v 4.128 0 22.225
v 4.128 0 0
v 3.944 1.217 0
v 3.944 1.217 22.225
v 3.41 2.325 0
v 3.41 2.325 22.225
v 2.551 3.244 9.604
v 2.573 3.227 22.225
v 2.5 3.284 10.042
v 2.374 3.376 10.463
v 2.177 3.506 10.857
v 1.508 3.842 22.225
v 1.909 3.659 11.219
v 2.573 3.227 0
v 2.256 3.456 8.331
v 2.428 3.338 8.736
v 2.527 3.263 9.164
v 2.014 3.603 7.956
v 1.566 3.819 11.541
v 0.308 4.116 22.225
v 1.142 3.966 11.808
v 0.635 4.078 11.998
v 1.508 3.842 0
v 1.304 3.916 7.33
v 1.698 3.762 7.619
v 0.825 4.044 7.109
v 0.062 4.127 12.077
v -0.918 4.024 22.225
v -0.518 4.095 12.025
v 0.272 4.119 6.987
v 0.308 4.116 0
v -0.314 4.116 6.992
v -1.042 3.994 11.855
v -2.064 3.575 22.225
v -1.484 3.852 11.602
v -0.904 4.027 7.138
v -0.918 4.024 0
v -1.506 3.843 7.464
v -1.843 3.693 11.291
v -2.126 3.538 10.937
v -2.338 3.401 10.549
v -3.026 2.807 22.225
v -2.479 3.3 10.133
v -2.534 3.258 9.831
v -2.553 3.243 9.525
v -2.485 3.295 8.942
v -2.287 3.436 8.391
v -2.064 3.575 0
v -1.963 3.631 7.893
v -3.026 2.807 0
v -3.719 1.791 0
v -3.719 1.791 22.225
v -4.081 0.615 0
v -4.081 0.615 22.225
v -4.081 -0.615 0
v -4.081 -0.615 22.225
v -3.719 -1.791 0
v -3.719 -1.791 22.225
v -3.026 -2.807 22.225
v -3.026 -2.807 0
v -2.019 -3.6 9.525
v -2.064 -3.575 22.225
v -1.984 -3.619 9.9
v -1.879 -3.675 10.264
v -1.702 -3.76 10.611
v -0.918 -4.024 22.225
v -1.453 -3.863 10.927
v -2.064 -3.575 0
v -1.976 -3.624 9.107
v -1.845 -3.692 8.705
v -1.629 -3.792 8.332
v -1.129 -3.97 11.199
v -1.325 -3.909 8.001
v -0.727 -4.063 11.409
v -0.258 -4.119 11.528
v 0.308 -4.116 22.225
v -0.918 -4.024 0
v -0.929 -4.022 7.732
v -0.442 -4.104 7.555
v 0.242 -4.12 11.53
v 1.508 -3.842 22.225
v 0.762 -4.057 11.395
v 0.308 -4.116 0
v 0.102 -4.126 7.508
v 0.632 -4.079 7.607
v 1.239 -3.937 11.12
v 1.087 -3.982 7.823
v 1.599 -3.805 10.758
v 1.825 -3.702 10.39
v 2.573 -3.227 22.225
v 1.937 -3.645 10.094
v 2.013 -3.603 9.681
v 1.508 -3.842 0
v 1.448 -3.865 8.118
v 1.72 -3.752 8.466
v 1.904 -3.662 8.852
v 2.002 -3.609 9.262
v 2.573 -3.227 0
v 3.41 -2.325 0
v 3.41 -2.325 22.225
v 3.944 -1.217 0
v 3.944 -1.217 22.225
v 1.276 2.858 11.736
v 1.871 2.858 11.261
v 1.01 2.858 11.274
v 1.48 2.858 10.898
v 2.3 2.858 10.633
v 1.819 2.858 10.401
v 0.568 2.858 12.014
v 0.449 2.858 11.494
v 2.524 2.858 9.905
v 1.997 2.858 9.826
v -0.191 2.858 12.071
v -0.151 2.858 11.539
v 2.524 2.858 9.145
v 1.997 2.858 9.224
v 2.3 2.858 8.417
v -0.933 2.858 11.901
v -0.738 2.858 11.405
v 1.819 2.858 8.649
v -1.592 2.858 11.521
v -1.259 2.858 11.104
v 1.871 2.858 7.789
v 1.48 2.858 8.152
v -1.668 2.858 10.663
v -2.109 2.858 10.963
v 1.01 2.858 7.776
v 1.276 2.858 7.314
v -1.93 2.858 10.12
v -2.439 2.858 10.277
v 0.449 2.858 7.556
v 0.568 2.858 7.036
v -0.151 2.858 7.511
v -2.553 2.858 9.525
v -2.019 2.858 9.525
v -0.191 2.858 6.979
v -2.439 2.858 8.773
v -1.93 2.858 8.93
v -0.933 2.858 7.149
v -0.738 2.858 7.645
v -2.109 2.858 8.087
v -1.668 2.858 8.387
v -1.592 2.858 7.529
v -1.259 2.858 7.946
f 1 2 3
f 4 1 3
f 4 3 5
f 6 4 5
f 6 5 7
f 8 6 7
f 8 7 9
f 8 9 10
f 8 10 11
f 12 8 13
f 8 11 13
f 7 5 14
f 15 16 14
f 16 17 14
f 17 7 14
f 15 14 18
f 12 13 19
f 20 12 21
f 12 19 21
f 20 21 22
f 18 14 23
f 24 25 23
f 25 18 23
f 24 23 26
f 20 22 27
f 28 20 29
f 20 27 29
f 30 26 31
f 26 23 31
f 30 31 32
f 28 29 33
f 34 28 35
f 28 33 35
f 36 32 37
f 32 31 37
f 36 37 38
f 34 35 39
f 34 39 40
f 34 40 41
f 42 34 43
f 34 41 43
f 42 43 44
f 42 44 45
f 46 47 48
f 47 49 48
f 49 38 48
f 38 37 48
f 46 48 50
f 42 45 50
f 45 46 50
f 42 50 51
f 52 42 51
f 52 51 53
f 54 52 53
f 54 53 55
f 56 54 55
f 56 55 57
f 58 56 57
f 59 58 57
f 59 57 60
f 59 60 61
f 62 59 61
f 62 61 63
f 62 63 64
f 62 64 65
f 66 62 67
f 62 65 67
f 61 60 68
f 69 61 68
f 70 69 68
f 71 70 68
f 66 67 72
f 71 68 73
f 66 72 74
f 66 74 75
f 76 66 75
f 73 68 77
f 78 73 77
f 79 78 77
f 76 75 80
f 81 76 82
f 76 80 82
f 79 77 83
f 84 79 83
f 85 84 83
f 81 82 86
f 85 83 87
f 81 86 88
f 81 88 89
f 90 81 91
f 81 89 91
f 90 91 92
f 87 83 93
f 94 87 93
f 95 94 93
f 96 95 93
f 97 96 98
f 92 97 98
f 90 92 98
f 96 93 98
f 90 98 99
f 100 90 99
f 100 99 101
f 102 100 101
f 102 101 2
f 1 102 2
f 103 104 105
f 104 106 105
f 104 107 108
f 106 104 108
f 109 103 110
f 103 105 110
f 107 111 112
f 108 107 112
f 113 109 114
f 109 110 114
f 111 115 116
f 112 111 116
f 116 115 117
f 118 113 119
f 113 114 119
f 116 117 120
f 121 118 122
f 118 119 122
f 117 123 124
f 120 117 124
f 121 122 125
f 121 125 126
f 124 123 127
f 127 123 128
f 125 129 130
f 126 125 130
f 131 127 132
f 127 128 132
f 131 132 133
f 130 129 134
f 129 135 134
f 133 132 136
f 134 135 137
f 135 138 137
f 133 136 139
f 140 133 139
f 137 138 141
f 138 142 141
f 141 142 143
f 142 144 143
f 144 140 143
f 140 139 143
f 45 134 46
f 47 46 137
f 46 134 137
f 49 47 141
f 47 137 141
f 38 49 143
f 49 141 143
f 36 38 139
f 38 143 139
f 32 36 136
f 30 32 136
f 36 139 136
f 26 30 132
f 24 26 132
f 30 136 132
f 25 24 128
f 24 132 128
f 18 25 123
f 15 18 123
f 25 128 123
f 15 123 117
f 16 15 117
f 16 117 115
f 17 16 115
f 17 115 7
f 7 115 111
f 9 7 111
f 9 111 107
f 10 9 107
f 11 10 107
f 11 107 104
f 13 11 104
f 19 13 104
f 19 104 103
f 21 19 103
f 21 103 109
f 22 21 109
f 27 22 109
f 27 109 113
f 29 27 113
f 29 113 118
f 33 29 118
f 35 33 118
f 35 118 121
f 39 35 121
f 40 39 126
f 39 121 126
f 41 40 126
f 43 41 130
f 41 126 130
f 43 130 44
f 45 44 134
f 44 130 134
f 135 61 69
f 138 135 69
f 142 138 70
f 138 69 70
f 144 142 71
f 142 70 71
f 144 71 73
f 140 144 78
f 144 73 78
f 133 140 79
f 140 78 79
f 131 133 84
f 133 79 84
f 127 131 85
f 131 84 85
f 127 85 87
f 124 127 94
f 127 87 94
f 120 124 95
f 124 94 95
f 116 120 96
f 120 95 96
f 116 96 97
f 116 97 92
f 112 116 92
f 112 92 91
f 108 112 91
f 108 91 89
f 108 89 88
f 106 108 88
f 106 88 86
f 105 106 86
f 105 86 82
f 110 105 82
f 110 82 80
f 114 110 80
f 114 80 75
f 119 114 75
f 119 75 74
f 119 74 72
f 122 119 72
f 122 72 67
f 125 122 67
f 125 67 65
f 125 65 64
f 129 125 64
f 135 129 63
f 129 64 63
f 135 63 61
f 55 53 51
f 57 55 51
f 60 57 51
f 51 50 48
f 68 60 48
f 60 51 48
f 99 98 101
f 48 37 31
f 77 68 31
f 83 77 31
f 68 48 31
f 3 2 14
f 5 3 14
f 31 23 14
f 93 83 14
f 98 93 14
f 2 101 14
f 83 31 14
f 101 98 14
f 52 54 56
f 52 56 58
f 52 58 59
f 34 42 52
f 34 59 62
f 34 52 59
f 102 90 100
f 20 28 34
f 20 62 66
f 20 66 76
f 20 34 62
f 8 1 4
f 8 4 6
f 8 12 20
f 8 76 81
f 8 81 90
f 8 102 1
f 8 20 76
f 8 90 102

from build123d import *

# Parameters (mm, degrees)
SKETCH1_R                      = 4.1275
BOSS_EXTRUDE1_DEPTH            = 22.225
F_7_0_201_DIAMETER_HOLE1_D     = 5.1054
F_7_0_201_DIAMETER_HOLE1_DEPTH = 1.27
F_10_32_TAPPED_HOLE1_D         = 4.0386


with BuildPart() as part:
    # Sketch1 → Boss-Extrude1 (new body)
    with BuildSketch(Plane.XY):
        Circle(SKETCH1_R)
    extrude(amount=BOSS_EXTRUDE1_DEPTH)

    # #7 (0.201) Diameter Hole1
    with Locations(Plane(origin=(0, 4.1275, 9.525), x_dir=(1, 0, 0), z_dir=(0, 1, 0))):
        with Locations((0, 0)):
            Hole(F_7_0_201_DIAMETER_HOLE1_D / 2, depth=F_7_0_201_DIAMETER_HOLE1_DEPTH)

    # #10-32 Tapped Hole1 (through all)
    with Locations(Plane(origin=(0, 4.1275, 9.525), x_dir=(1, 0, 0), z_dir=(0, 1, 0))):
        with Locations((0, 0)):
            Hole(F_10_32_TAPPED_HOLE1_D / 2)


solid = part.part
